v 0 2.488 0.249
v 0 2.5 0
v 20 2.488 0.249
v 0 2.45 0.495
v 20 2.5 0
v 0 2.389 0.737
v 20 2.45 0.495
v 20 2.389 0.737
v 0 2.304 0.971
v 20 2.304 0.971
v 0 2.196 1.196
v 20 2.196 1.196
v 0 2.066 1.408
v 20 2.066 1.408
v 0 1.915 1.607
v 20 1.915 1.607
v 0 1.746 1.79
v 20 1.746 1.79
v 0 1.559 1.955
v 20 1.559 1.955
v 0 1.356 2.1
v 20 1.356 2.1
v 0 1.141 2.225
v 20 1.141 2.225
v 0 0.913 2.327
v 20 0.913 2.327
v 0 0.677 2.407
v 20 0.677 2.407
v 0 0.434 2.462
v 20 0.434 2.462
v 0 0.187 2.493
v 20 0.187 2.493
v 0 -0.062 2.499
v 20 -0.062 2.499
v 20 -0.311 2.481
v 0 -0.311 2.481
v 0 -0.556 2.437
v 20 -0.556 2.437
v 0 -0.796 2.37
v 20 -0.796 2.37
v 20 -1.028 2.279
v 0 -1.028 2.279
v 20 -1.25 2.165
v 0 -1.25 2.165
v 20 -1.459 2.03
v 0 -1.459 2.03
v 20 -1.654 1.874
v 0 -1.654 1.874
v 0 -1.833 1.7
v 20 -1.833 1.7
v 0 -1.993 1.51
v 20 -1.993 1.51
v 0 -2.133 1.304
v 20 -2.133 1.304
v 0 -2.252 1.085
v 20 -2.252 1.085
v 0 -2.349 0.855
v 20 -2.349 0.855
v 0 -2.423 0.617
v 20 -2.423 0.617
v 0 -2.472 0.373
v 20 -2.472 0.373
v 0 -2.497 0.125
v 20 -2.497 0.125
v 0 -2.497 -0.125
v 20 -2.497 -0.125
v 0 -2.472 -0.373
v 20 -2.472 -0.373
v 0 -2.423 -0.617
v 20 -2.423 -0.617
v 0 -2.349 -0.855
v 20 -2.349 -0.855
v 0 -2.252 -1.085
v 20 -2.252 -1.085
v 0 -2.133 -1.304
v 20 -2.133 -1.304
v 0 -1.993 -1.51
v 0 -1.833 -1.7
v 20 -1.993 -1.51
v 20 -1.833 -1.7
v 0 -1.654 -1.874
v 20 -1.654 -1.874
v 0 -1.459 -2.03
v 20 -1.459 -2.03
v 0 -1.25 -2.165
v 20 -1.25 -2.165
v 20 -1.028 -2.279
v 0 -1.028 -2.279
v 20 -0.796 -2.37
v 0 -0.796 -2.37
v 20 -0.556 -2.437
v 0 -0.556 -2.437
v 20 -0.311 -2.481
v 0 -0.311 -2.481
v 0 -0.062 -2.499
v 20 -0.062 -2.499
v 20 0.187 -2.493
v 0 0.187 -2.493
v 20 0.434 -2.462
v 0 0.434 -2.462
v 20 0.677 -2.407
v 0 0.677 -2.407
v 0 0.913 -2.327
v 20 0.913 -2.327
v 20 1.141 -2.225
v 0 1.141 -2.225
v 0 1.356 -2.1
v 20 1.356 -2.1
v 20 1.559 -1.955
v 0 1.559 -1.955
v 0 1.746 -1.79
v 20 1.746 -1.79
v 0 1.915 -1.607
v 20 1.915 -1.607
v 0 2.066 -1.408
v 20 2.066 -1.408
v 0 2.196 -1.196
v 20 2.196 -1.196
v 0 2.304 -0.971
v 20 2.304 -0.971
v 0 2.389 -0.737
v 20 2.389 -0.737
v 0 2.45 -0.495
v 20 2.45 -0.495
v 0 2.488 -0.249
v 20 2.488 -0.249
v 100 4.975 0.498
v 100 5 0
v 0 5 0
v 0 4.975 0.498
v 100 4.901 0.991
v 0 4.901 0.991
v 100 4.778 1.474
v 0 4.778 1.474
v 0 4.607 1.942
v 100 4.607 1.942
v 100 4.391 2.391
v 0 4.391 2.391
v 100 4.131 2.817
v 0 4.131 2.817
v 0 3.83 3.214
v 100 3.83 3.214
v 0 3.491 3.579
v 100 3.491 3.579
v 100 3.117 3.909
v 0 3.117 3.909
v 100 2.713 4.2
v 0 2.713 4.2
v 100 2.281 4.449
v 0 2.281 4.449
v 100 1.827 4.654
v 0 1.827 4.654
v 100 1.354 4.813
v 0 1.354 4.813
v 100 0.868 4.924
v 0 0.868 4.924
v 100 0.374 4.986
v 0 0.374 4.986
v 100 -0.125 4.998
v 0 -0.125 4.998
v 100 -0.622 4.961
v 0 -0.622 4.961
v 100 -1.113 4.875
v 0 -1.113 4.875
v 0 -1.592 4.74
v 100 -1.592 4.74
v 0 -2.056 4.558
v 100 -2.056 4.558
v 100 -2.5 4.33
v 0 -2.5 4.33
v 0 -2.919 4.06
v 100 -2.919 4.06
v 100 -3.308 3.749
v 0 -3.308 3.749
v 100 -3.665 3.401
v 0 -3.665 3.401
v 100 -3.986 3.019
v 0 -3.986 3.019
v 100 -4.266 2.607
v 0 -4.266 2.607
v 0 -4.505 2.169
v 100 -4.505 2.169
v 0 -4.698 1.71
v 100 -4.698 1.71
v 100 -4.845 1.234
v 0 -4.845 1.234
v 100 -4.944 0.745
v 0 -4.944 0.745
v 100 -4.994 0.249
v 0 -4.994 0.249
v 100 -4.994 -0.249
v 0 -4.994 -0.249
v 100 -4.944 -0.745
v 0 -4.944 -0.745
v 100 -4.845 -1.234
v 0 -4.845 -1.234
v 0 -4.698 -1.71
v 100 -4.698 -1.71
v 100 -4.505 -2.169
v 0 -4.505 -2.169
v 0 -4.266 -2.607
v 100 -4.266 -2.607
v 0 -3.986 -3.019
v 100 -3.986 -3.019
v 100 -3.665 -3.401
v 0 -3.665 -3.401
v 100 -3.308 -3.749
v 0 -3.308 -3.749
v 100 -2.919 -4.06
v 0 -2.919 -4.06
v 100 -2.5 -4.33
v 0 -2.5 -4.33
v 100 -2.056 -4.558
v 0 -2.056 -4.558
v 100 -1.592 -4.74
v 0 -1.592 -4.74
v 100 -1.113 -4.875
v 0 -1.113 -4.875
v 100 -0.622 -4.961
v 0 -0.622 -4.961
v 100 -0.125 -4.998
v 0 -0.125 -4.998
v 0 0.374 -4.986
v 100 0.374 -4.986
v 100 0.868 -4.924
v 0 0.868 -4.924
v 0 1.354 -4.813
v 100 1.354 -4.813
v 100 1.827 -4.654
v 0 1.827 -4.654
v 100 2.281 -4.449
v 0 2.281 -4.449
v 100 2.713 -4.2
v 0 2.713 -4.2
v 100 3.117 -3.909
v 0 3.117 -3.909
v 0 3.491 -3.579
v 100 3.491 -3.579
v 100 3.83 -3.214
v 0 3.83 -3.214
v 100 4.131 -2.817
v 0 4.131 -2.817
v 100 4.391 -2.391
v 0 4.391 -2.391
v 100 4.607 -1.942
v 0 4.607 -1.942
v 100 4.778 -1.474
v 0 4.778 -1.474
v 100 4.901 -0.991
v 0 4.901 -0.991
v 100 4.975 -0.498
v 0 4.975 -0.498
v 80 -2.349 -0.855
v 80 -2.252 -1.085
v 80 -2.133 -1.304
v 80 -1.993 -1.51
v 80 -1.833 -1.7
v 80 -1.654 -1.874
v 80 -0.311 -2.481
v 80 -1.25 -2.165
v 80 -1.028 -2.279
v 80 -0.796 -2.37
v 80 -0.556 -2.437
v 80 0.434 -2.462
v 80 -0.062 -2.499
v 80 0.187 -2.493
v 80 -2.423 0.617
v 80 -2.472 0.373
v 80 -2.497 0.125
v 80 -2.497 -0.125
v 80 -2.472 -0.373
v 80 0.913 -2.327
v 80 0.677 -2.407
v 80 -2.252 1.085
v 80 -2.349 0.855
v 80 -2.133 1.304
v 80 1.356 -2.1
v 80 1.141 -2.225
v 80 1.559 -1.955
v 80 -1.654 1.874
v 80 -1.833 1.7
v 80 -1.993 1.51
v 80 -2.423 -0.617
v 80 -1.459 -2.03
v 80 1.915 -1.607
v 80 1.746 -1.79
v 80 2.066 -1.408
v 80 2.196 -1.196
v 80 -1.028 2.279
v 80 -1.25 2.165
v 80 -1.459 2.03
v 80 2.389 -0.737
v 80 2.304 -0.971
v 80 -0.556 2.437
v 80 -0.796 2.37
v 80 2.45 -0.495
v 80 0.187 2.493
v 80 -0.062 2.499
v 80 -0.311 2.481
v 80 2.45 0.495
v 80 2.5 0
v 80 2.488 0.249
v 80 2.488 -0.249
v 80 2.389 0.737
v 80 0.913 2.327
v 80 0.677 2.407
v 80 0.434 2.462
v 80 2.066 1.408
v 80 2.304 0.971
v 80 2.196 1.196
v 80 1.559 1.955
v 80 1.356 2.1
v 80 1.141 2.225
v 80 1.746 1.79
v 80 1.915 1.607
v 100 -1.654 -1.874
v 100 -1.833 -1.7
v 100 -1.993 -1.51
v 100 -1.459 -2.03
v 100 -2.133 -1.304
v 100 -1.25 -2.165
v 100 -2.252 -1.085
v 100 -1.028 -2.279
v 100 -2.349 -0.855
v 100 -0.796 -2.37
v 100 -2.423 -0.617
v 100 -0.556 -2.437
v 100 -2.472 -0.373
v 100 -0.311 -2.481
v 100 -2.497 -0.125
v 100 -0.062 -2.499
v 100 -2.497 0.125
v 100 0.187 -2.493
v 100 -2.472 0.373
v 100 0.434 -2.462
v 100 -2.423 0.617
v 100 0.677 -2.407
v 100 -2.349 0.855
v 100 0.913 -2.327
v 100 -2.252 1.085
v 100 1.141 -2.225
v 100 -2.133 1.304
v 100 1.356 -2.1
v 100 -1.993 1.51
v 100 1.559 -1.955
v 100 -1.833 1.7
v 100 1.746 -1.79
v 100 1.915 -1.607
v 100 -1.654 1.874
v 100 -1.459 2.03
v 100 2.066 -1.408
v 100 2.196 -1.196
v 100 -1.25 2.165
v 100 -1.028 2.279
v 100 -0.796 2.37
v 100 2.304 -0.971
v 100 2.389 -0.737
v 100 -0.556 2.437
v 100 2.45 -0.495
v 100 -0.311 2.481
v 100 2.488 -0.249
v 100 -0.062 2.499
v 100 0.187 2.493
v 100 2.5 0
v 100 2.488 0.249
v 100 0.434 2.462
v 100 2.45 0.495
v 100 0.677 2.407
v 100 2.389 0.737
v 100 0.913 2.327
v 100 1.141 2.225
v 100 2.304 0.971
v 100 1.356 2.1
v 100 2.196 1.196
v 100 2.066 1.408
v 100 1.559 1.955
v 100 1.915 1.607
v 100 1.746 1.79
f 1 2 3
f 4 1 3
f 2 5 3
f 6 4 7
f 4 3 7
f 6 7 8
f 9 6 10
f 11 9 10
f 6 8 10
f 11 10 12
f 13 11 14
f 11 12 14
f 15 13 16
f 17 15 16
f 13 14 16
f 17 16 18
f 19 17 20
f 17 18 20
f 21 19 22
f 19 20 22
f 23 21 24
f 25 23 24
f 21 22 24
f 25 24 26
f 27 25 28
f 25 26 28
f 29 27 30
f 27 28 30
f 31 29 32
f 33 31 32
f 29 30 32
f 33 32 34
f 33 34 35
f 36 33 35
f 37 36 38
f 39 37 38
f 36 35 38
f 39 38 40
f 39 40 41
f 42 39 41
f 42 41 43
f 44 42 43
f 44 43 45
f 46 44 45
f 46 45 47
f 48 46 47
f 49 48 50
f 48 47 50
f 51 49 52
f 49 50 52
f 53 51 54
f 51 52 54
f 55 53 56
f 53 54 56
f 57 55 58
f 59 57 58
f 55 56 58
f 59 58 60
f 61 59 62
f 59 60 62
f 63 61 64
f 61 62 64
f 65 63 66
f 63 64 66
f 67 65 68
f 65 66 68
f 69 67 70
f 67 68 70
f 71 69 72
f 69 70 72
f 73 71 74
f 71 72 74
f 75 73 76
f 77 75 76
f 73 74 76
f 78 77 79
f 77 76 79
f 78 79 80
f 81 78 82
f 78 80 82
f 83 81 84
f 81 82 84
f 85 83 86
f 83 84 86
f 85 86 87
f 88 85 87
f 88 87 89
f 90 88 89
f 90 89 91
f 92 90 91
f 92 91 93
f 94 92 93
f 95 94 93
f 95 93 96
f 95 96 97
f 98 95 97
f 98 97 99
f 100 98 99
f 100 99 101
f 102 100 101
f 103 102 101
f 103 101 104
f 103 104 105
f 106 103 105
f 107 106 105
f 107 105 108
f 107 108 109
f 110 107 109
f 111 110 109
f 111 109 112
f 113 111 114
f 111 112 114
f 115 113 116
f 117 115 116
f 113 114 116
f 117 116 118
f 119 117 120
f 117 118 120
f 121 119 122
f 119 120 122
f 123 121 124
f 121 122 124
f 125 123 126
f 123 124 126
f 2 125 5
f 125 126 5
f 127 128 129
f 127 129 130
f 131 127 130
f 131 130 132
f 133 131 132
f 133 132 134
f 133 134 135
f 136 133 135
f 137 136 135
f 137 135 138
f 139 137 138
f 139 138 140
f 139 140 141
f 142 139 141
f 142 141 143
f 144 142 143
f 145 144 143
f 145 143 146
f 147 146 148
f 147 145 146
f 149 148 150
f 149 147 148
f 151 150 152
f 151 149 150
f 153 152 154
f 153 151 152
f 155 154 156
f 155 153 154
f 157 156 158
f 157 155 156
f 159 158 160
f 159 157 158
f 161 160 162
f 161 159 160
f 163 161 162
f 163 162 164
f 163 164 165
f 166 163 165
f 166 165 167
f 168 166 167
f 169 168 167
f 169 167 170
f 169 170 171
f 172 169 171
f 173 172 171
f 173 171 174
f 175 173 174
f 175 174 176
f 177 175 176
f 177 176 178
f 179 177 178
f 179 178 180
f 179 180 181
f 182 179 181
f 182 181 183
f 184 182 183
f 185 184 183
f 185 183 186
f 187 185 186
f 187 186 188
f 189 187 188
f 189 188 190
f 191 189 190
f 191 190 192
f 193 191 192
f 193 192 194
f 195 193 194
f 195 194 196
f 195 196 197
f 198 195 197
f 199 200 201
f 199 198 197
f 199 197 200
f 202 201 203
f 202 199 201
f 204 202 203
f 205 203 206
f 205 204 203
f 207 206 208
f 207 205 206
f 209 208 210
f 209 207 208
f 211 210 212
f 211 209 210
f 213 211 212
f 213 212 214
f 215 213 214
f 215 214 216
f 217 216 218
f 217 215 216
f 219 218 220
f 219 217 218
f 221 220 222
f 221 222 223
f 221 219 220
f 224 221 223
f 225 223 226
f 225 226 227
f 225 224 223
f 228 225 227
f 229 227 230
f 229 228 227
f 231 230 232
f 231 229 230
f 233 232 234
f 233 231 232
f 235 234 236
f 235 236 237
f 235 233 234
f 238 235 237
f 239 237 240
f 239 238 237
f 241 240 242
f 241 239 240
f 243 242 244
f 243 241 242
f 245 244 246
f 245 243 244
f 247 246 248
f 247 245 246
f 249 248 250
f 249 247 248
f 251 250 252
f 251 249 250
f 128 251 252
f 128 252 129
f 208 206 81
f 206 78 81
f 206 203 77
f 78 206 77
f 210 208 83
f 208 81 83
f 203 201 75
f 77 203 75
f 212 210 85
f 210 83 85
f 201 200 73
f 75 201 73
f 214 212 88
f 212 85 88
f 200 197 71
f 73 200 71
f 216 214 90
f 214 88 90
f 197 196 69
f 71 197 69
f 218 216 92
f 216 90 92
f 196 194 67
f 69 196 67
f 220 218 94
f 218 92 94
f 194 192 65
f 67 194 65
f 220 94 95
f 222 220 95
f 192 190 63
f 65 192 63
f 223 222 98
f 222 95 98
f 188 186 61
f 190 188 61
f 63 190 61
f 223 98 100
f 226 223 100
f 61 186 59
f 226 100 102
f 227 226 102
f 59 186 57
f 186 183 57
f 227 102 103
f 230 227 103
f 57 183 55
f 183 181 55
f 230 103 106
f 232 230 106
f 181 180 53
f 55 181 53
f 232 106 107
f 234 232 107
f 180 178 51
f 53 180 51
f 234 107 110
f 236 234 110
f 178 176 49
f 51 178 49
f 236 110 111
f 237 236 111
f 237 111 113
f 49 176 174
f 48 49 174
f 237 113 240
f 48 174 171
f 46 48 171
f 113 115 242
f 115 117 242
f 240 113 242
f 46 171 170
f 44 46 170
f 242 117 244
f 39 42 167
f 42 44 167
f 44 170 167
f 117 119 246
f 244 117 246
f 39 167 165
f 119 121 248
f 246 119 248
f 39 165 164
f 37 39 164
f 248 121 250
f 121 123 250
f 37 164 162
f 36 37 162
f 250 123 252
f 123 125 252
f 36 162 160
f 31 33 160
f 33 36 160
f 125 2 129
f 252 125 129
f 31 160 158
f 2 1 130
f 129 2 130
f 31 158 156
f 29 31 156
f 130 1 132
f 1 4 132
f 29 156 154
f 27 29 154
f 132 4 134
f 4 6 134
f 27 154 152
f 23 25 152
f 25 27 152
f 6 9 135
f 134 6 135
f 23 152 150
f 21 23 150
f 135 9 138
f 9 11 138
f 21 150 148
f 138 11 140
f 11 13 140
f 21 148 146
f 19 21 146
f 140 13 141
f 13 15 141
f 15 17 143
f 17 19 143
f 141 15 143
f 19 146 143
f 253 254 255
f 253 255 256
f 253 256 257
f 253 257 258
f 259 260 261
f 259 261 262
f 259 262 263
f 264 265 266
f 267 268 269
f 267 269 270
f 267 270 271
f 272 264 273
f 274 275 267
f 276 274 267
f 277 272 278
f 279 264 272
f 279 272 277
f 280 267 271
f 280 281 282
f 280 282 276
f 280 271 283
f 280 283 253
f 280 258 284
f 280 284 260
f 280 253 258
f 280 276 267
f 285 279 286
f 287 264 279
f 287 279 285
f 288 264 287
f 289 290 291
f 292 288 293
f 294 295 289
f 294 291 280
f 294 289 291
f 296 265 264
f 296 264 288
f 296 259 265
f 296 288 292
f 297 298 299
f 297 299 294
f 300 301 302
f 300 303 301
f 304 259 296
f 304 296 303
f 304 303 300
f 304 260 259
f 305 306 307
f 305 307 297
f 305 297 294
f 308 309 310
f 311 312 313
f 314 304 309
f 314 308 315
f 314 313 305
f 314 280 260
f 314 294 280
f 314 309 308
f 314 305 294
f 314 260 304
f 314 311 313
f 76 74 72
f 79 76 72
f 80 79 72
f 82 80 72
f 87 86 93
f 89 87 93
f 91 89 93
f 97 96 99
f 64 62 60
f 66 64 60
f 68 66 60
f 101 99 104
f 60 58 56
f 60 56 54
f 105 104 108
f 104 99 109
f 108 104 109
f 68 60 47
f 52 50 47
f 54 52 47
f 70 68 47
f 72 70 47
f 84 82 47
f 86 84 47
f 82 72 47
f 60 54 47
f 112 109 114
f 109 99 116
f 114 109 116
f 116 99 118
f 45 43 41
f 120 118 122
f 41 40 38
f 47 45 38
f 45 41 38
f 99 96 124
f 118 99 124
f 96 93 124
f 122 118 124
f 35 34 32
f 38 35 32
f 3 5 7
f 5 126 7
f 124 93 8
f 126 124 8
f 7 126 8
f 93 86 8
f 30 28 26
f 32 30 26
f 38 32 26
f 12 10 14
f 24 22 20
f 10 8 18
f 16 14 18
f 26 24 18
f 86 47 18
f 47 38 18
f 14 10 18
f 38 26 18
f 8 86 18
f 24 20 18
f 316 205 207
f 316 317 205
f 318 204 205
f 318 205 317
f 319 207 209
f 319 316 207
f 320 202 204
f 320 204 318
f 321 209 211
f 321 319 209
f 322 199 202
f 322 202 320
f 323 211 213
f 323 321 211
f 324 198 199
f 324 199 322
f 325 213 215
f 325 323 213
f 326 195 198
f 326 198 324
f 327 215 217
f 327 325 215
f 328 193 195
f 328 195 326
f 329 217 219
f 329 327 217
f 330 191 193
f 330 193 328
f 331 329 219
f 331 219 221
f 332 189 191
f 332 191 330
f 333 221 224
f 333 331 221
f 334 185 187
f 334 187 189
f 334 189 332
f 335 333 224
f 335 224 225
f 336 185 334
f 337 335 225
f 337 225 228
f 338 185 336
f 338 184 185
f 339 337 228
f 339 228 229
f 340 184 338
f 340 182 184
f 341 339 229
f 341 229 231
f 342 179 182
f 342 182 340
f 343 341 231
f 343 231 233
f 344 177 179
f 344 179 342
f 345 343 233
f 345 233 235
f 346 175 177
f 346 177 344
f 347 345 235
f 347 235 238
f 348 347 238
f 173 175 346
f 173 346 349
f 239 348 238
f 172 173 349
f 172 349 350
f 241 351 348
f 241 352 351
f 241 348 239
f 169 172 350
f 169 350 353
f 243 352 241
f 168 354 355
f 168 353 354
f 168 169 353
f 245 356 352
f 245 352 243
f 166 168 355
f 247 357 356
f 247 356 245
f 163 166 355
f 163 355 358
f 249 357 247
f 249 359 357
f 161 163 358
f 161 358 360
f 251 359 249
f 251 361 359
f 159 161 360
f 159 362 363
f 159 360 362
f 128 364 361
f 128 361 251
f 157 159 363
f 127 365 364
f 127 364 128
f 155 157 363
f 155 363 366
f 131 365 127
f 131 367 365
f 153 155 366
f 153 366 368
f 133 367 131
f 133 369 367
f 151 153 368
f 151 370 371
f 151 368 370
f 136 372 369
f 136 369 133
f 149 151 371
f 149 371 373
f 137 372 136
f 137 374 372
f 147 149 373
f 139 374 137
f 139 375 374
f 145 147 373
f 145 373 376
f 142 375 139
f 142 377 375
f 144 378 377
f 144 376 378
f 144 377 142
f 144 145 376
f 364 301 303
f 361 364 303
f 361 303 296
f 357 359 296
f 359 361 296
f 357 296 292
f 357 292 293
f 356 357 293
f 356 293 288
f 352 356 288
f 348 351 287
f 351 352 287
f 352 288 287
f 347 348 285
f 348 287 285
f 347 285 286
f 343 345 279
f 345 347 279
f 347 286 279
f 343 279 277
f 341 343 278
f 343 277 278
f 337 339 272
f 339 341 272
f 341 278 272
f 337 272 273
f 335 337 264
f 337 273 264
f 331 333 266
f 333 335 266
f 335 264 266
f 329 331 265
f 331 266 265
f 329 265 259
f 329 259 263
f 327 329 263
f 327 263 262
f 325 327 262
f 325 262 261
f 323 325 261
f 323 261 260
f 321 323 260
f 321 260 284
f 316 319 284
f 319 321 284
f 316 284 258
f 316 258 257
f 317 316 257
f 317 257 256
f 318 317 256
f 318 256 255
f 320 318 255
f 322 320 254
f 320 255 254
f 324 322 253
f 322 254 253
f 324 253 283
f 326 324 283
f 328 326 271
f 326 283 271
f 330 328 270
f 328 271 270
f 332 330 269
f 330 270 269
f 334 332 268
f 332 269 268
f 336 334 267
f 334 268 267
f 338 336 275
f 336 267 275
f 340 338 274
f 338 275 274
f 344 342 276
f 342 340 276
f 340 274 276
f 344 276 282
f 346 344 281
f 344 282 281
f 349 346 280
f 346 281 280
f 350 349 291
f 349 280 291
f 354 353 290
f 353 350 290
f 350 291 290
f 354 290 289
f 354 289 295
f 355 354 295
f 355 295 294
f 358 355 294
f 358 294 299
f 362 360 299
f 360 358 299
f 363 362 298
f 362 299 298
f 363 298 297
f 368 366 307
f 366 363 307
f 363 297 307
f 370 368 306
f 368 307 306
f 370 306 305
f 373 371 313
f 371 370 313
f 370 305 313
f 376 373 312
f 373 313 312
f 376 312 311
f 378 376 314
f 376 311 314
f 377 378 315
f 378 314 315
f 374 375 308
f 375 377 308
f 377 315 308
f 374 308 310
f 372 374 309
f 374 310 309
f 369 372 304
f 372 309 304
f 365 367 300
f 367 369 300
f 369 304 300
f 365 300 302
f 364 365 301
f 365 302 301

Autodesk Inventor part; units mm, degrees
ref_plane "Start Plane" through (0, 0, 0) normal (1, 0, 0) x (0, 1, 0)
ref_plane "XZ Plane" through (0, 0, 0) normal (0, 1, 0) x (-1, 0, 0)
ref_plane "XY Plane" through (0, 0, 0) normal (0, 0, 1) x (1, 0, 0)
sketch "Main Sketch" plane through (0, 0, 0) normal (0, 0, 1) x (1, 0, 0)
  line L0 (0, 0) -> (100, 0)
  line L1 (0, 2.5) -> (0, 5)
  line L2 (100, 5) -> (100, 2.5)
  line L3 (0, 5) -> (100, 5)
  line L4 (20, 2.5) -> (20, 0)
  line L5 (0, 2.5) -> (20, 2.5)
  line L6 (80, 2.5) -> (80, 0)
  line L7 (100, 2.5) -> (80, 2.5)
  line L8 (20, 0) -> (80, 0)
  dimension "d3" = 10
  dimension "d4" = 5
  dimension "d5" = 5
revolve "Revolution1" add sketch "Main Sketch" angle 360 about axis through (0, 0, 0) along (1, 0, 0)
equation "\"Length\" = 100"
properties part number "Shaft" material "Steel"
